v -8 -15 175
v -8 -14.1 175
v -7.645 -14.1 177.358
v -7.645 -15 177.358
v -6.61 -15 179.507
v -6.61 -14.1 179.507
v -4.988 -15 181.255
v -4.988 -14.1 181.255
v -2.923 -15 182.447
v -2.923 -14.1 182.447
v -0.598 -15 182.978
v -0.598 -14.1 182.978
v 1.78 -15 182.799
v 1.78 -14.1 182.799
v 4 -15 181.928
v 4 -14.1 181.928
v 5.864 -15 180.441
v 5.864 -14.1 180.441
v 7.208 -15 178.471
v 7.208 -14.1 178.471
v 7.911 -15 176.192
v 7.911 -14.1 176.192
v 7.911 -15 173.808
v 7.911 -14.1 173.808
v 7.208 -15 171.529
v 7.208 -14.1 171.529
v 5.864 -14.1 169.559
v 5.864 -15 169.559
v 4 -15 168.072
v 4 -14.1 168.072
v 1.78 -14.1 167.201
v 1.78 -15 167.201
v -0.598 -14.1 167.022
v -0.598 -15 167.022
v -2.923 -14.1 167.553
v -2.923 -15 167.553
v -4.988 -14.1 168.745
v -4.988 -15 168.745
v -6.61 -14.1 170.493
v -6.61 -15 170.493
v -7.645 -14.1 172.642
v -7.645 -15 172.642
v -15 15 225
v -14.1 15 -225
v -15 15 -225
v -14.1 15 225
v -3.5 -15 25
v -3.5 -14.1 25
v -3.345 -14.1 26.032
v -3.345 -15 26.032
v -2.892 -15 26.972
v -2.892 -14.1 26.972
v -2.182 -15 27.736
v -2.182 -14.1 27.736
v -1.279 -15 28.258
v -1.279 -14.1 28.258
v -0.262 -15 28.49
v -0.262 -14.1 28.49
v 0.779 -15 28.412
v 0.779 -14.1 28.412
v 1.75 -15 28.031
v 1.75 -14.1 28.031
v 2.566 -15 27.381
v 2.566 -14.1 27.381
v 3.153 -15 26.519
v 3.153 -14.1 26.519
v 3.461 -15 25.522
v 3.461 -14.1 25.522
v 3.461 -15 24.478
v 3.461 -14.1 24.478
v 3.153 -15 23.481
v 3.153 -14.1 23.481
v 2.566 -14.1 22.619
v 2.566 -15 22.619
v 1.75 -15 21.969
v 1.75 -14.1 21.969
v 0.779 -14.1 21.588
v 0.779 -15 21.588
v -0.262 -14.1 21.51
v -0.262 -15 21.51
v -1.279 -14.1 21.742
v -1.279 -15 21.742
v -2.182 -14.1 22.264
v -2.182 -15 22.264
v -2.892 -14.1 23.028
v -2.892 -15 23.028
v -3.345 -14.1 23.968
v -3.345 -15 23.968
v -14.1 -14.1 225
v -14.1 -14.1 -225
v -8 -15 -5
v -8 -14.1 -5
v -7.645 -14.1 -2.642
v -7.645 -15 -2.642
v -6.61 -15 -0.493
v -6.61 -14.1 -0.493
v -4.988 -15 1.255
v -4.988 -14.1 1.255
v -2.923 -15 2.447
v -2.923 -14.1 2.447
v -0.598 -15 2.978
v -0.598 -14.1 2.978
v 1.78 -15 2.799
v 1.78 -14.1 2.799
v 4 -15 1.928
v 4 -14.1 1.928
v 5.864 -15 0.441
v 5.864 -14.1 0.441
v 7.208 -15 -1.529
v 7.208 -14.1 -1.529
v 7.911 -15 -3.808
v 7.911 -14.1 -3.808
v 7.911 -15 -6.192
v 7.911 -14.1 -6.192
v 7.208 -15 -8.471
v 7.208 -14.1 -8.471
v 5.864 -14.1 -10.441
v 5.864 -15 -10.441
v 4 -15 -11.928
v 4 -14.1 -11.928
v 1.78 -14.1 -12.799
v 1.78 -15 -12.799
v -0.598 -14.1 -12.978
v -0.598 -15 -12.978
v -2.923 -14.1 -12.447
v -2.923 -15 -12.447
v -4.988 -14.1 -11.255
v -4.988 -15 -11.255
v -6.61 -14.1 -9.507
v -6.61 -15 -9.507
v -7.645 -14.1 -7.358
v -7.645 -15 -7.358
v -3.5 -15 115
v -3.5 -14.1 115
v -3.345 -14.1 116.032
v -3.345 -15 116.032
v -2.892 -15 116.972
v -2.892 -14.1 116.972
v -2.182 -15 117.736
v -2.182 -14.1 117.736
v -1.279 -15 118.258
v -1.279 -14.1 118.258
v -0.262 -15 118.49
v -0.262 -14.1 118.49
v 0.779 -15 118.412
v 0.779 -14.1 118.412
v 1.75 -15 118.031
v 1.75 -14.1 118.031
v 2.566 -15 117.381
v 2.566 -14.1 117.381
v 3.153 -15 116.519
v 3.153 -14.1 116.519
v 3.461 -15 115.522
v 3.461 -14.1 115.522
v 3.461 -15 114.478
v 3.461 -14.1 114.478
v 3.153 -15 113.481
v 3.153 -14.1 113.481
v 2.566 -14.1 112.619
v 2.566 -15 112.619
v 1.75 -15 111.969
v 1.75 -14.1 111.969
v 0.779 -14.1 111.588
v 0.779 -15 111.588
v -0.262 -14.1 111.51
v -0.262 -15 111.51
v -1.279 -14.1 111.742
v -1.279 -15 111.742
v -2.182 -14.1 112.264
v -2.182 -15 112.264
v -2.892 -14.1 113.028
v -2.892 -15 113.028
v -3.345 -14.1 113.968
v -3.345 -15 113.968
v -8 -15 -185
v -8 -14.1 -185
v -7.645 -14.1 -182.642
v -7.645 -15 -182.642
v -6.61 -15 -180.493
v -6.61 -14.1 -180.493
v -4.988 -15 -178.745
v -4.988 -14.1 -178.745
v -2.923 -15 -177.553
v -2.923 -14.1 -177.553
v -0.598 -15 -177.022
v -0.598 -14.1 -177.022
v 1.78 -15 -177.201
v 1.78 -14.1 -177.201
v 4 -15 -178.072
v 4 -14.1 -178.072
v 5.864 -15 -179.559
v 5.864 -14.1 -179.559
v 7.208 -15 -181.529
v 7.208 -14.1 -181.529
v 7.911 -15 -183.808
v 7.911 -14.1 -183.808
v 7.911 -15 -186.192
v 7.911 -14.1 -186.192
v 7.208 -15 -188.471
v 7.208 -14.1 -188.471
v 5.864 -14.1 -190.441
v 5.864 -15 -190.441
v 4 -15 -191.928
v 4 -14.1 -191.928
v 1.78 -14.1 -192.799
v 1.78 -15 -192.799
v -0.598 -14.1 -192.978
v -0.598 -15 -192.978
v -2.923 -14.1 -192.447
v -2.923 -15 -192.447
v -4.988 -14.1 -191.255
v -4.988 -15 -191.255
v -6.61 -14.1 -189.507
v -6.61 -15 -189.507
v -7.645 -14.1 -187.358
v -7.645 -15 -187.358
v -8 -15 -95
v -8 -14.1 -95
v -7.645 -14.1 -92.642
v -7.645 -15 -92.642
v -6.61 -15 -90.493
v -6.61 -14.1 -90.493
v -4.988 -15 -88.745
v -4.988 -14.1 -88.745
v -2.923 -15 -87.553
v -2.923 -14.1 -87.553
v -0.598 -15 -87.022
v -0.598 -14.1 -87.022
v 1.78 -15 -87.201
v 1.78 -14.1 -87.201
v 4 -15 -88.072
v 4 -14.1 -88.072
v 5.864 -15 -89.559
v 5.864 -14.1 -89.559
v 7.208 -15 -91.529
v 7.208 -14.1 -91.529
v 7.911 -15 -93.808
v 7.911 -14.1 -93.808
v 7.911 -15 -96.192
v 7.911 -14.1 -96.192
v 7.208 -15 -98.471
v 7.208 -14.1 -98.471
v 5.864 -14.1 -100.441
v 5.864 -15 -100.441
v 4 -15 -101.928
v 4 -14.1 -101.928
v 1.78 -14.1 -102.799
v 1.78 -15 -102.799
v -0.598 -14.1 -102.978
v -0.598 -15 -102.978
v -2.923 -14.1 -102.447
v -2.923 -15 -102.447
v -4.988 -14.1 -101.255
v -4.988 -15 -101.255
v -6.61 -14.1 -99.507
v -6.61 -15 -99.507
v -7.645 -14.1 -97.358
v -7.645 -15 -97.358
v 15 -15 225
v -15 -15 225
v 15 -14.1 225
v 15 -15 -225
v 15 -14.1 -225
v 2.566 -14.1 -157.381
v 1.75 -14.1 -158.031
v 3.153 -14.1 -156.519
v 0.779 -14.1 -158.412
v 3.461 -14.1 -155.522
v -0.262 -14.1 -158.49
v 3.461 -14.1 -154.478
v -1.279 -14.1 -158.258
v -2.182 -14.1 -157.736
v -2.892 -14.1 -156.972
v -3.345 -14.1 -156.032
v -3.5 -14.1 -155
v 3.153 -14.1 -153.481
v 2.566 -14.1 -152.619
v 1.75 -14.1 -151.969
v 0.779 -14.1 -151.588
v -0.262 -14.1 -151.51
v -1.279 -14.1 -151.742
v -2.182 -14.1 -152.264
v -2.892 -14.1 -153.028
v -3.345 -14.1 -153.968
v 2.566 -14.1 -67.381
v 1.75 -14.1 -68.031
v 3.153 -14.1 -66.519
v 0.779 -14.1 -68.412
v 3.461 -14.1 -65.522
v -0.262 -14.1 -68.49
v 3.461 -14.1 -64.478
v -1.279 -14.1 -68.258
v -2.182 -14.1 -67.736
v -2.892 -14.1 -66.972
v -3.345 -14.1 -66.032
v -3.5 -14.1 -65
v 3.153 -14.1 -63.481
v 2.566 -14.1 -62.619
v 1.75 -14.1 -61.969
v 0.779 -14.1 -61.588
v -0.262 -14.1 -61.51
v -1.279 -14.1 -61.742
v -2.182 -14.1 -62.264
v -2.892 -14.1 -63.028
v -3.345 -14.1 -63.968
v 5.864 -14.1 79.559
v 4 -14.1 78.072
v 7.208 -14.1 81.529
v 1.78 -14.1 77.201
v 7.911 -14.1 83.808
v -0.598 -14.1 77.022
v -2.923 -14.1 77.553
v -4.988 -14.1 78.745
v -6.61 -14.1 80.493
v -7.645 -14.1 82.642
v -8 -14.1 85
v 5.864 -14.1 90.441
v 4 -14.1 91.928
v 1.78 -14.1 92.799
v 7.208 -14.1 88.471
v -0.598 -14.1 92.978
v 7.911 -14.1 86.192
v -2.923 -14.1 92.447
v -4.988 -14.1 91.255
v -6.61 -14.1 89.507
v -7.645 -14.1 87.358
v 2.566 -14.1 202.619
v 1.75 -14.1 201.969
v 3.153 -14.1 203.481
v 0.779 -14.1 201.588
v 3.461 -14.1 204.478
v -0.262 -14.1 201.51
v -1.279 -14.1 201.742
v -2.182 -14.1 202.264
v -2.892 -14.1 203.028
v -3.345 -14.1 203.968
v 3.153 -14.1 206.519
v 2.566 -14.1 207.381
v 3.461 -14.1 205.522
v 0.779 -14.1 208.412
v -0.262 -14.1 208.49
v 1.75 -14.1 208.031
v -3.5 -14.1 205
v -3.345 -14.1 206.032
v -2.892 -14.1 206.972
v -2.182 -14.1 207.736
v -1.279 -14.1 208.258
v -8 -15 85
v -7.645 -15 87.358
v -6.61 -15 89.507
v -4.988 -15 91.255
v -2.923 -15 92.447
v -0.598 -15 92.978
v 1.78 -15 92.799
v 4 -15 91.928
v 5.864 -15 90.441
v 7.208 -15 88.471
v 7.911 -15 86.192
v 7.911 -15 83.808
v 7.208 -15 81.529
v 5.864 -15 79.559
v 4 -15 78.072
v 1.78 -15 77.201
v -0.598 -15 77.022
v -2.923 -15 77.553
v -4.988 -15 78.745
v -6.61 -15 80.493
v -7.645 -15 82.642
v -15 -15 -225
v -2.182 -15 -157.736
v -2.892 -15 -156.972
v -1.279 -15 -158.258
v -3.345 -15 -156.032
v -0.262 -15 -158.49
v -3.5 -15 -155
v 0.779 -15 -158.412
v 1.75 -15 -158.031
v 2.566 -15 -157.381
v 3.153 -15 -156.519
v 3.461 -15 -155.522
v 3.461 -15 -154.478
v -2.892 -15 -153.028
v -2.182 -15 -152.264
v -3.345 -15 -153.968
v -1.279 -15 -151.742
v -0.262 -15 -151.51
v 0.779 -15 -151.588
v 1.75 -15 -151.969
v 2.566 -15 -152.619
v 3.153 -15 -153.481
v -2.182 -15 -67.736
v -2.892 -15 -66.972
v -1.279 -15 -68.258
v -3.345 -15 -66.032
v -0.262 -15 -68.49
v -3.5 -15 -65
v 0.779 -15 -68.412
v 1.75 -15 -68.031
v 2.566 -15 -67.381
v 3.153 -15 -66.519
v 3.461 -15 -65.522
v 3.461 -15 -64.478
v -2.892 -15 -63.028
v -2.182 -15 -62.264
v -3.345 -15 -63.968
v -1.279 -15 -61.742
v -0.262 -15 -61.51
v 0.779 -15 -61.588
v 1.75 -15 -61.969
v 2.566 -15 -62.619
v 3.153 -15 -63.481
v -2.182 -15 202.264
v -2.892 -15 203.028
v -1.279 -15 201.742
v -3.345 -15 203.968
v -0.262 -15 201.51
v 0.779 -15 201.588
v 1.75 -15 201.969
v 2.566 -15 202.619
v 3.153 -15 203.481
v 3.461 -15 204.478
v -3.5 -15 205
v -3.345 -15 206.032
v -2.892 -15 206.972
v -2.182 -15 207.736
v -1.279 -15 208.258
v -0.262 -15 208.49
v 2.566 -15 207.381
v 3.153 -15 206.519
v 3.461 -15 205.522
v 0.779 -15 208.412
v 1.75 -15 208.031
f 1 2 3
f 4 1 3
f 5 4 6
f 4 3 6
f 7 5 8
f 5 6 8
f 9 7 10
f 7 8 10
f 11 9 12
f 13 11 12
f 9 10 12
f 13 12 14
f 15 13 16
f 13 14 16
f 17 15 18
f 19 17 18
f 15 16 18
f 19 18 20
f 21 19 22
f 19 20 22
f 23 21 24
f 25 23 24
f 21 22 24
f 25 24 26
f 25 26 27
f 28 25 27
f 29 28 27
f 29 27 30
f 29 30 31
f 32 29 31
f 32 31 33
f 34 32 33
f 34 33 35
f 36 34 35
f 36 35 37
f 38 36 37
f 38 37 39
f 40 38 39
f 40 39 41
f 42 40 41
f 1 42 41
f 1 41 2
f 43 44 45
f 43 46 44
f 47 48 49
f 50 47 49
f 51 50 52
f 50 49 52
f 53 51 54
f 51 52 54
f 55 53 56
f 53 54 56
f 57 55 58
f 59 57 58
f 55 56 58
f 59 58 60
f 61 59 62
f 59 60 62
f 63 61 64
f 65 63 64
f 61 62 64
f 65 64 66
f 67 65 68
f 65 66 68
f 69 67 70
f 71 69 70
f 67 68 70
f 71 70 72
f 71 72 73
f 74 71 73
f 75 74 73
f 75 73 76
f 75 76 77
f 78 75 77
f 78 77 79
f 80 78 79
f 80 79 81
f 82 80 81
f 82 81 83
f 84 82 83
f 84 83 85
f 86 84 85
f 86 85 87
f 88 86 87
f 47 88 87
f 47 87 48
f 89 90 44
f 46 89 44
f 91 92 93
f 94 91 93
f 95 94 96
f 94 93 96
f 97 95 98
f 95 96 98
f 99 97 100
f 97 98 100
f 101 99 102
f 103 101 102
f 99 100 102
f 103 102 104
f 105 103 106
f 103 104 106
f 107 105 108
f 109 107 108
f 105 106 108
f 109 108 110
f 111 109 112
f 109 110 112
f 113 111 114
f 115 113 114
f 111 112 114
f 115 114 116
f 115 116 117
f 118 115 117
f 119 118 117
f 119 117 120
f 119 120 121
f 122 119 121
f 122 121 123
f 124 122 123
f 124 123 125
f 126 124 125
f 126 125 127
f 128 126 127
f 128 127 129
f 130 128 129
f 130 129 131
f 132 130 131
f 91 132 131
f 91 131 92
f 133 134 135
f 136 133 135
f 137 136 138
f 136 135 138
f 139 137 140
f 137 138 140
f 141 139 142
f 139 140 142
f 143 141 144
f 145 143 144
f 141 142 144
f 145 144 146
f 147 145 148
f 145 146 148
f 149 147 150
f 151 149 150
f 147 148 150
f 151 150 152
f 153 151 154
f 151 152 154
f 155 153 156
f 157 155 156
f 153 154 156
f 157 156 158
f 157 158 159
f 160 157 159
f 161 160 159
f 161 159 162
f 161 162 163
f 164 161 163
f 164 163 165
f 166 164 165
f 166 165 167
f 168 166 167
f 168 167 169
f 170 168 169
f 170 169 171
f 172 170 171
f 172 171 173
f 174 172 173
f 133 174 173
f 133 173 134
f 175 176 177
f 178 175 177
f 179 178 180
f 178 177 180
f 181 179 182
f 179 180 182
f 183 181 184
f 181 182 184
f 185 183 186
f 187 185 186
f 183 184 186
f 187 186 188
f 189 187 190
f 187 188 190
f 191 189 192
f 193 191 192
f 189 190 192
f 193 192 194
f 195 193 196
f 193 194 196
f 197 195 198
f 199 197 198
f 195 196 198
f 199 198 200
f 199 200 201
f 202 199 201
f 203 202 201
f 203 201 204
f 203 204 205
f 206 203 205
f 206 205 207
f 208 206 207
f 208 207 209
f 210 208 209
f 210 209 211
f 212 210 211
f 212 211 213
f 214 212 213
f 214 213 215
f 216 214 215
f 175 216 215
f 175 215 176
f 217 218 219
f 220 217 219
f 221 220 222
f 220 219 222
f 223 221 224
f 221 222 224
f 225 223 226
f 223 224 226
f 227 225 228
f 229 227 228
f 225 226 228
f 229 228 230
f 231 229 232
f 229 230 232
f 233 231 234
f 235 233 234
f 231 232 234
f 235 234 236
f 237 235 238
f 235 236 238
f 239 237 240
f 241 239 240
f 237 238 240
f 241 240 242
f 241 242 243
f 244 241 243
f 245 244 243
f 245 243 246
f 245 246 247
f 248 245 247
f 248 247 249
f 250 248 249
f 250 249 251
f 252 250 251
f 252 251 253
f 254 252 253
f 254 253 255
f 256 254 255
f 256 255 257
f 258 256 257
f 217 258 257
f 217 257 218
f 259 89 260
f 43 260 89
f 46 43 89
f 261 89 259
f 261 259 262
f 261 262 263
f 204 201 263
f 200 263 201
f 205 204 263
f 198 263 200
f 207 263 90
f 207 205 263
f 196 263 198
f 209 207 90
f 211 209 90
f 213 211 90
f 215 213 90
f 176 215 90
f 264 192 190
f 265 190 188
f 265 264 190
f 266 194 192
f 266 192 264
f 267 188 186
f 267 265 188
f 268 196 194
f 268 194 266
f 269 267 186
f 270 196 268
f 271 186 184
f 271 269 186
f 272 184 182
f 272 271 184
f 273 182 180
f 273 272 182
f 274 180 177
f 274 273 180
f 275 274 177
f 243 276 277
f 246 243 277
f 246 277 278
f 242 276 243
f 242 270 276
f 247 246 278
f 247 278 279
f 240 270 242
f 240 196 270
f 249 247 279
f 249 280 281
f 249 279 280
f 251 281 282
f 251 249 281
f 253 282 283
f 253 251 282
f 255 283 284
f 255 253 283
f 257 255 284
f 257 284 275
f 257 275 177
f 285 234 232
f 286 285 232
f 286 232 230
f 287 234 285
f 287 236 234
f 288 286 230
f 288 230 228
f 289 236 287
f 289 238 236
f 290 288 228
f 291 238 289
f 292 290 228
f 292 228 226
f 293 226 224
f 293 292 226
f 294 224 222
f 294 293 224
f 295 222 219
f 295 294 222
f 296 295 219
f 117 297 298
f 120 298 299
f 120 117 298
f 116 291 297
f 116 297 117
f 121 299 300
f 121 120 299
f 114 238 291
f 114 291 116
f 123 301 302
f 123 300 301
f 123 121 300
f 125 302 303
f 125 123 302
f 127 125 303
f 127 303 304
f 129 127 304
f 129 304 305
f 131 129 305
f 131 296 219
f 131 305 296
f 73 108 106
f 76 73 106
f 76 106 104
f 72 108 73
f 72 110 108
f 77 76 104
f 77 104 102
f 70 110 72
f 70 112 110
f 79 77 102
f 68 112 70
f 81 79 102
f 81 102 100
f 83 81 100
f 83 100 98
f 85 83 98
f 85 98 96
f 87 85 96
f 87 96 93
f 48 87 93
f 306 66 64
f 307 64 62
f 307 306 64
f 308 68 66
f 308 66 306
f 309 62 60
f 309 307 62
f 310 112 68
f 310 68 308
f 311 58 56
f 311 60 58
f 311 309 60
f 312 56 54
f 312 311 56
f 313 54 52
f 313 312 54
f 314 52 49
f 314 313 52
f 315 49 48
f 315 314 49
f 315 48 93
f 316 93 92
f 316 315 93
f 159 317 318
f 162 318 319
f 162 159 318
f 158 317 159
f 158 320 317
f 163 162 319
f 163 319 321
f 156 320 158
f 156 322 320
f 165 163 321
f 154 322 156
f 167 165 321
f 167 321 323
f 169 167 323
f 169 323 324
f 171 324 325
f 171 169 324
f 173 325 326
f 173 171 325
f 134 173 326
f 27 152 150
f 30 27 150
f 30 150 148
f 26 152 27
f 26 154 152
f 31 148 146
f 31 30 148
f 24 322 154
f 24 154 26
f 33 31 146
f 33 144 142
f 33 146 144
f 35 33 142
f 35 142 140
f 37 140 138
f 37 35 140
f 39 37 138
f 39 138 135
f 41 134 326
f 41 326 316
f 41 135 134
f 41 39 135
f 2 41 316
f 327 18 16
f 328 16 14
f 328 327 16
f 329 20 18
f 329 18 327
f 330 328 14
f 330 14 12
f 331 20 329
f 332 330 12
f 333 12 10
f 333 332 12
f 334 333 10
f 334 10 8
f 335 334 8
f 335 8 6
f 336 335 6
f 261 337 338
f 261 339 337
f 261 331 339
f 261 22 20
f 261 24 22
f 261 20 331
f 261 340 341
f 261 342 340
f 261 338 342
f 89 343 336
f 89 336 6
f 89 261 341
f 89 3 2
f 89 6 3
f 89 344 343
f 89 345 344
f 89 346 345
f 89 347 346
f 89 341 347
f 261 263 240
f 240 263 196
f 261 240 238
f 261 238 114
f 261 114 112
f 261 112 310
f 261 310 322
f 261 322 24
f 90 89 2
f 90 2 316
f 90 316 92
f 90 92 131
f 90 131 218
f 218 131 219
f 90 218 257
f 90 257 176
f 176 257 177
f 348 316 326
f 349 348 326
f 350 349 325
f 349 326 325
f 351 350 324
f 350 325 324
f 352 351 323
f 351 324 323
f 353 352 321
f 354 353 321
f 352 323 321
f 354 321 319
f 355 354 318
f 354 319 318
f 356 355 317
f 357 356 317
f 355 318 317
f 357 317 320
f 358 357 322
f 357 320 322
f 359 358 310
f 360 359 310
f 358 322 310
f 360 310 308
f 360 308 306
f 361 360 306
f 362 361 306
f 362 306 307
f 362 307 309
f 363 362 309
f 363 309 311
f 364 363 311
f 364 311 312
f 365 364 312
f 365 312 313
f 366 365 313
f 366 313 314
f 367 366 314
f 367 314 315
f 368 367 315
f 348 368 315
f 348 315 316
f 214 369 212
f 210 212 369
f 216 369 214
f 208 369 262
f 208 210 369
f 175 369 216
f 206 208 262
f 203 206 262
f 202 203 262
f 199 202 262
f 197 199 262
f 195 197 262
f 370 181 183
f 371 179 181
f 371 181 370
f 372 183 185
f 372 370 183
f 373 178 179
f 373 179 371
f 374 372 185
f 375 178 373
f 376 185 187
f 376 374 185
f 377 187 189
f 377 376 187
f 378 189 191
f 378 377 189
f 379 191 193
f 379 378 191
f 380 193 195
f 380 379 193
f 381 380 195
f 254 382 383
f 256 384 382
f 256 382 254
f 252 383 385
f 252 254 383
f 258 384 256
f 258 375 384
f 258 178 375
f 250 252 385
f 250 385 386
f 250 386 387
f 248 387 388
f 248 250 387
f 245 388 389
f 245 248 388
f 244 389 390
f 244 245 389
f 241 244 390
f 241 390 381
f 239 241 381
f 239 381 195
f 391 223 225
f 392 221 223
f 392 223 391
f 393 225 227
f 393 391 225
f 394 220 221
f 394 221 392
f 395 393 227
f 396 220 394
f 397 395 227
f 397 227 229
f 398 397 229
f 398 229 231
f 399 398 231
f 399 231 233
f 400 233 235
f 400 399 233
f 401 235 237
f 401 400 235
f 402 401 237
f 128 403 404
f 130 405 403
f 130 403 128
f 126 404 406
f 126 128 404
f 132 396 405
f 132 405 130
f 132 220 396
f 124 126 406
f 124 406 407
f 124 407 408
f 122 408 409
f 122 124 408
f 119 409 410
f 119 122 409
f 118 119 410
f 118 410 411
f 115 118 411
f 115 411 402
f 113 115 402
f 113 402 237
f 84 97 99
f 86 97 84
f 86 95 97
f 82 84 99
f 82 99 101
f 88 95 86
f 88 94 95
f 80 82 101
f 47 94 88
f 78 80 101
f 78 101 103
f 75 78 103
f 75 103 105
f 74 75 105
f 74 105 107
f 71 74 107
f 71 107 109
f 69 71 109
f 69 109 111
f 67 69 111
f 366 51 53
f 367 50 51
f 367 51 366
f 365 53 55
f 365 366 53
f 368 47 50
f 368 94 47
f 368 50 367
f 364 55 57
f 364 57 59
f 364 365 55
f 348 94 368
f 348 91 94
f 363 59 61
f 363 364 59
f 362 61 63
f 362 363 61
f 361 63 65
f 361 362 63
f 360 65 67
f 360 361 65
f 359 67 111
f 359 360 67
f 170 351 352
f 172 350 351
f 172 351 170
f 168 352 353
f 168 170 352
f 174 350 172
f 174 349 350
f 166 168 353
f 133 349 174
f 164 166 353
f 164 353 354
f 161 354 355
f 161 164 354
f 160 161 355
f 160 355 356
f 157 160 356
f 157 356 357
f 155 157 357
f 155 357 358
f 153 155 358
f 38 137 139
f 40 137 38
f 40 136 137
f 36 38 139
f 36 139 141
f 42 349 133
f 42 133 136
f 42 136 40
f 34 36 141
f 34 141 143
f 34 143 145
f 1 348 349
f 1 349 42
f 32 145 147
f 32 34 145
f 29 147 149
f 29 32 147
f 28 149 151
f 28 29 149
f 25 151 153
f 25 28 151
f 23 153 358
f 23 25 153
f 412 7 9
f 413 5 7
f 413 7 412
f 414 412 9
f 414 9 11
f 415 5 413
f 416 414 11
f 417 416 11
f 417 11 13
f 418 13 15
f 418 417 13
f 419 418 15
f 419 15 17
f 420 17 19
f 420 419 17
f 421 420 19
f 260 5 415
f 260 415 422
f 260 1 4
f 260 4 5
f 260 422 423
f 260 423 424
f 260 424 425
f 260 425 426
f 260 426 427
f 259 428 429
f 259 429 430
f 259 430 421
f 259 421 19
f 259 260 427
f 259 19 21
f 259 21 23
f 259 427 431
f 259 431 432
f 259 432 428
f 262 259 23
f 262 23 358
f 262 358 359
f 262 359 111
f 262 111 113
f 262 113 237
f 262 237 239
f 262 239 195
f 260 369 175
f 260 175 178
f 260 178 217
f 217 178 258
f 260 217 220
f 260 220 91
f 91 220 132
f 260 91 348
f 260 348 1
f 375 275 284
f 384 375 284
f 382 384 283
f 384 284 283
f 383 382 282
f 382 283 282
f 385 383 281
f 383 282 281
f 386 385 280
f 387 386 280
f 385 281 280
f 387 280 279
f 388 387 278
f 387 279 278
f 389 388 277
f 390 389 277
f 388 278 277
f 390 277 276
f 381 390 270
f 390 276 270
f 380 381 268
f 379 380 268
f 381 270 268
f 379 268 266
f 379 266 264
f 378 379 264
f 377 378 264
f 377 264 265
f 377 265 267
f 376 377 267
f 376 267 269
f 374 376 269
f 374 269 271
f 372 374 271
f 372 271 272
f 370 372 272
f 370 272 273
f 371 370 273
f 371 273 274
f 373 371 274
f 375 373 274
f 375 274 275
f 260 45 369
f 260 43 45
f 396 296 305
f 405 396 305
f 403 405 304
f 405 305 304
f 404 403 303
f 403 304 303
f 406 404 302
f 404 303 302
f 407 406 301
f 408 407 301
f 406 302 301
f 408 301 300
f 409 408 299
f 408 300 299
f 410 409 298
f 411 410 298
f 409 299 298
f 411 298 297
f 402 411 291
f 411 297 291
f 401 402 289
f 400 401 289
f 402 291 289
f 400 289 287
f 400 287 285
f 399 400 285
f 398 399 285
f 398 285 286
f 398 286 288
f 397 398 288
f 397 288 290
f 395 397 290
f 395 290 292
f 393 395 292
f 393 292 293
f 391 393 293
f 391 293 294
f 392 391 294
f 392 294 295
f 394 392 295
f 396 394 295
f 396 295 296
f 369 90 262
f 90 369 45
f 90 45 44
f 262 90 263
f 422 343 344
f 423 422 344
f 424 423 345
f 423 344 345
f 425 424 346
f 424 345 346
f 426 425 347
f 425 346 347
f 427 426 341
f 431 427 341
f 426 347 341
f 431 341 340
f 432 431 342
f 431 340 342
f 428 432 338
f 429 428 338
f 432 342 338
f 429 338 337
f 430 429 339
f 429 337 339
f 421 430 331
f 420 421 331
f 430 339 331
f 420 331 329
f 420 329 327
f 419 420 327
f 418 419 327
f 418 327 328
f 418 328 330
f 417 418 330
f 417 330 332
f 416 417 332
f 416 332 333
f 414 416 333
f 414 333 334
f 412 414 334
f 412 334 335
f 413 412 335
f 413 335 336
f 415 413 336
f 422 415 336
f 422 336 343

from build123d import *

# Parameters (mm, degrees)
F1_DEPTH = 225
F3_D     = 16
F4_D     = 7


with BuildPart() as f1:
    # F0 (on Top) → F1 (new body, symmetric)
    with BuildSketch(Plane.XY):
        Polygon((-15, -15), (15, -15), (15, -14.1), (-14.1, -14.1), (-14.1, 15), (-15, 15), align=None)
    extrude(amount=F1_DEPTH, both=True)

    # F3 (through all)
    with Locations(Plane.XZ.offset(15)):
        with Locations((0, 175), (0, 85), (0, -5), (0, -95), (0, -185)):
            Hole(F3_D / 2)

    # F4 (through all)
    with Locations(Plane.XZ.offset(15)):
        with Locations((0, -155), (0, -65), (0, 25), (0, 115), (0, 205)):
            Hole(F4_D / 2)


solid = f1.part
